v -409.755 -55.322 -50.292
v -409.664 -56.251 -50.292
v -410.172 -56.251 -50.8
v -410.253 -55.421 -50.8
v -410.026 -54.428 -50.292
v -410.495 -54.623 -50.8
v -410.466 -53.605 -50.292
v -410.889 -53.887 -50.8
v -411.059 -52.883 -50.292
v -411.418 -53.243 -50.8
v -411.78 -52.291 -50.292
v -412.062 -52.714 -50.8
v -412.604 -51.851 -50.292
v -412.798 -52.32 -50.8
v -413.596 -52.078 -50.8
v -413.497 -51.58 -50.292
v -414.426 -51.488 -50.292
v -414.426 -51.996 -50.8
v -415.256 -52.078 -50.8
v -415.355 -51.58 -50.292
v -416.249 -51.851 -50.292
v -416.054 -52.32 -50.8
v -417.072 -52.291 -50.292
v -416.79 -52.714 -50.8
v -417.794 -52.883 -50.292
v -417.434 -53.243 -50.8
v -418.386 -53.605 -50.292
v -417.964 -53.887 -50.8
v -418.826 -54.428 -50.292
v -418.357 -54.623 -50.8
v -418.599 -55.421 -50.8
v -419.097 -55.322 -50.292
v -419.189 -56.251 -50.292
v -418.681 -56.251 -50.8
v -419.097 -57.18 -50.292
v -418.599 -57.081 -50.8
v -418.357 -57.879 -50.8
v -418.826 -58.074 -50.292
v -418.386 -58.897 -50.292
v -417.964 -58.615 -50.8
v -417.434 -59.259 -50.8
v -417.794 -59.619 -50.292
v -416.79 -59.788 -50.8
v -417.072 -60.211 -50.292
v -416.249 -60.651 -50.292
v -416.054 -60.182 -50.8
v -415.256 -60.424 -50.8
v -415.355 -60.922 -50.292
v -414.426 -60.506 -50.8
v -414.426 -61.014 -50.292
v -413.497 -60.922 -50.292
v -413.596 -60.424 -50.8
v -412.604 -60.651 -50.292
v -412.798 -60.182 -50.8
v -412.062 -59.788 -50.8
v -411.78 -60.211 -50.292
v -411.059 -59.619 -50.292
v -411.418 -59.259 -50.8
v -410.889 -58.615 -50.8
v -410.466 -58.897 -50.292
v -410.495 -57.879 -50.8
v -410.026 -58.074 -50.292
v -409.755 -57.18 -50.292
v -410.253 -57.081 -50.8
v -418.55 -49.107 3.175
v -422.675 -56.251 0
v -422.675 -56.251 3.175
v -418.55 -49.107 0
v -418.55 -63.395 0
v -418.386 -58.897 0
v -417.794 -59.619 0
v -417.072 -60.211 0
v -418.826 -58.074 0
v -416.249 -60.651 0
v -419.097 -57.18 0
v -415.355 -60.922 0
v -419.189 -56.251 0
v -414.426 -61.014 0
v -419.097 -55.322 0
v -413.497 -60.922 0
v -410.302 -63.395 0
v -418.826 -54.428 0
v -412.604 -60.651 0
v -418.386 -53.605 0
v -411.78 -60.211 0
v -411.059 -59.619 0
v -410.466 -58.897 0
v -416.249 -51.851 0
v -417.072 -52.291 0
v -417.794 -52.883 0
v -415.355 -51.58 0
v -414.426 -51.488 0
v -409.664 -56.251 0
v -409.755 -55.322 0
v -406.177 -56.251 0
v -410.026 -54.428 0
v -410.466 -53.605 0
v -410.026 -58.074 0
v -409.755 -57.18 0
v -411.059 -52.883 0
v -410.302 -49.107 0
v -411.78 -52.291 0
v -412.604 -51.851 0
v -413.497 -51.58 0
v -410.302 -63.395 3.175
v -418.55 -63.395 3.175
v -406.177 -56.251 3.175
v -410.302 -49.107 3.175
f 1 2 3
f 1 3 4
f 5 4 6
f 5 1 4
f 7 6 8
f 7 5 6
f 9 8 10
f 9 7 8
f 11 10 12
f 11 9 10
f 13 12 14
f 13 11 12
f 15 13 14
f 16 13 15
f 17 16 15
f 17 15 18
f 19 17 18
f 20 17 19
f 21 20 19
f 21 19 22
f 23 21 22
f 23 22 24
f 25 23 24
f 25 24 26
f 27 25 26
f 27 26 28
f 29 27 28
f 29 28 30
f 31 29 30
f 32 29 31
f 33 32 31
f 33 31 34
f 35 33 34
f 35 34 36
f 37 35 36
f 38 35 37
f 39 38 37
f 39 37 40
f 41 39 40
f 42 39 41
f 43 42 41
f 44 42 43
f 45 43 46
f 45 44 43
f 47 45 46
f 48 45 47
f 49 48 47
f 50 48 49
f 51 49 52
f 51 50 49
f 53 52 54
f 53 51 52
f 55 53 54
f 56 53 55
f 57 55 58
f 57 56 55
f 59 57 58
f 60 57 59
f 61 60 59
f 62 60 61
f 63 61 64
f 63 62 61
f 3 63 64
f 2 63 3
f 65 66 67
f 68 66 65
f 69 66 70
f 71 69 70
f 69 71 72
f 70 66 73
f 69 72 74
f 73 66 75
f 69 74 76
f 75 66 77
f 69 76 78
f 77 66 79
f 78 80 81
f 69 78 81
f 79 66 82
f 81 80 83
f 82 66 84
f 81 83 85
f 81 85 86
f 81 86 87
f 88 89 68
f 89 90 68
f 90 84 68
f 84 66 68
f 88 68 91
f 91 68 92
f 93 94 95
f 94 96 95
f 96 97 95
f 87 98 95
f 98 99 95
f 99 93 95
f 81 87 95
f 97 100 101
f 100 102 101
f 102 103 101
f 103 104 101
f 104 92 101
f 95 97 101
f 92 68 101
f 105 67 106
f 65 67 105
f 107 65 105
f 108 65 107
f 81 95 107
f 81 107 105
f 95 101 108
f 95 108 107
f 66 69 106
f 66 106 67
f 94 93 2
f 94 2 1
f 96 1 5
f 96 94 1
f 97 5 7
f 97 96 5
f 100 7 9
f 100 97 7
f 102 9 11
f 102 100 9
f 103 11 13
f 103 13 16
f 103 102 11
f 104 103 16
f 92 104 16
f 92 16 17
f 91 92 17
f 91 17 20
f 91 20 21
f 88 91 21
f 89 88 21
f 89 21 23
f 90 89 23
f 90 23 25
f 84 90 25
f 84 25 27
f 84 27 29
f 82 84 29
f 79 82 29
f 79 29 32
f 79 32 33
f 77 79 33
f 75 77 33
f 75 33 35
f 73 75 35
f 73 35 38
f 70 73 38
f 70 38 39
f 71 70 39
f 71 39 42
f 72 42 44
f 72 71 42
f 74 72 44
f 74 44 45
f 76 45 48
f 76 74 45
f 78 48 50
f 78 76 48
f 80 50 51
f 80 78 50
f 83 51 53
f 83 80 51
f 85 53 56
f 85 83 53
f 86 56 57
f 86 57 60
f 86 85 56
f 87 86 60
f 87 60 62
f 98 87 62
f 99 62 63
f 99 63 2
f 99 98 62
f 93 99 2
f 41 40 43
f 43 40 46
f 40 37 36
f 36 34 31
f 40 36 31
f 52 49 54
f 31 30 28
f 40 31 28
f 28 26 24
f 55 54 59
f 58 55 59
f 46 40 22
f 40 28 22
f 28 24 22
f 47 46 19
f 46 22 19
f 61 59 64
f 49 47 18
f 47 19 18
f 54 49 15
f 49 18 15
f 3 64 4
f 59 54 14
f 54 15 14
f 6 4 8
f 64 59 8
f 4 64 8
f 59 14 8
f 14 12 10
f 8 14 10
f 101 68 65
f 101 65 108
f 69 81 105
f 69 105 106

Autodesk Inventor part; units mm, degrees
ref_plane "YZ Plane" through (0, 0, 0) normal (1, 0, 0) x (0, 1, 0)
ref_plane "XZ Plane" through (0, 0, 0) normal (0, 1, 0) x (-1, 0, 0)
ref_plane "XY Plane" through (0, 0, 0) normal (0, 0, 1) x (1, 0, 0)
sketch "Sketch1" plane through (0, 0, 0) normal (0, 0, 1) x (1, 0, 0)
  circle A0 centre (-414.4261, -56.251) radius 4.7625
  point P0 (0, 0)
  dimension "d0" = 9.525
extrude "Extrusion1" add sketch "Sketch1" against normal blind 50.8
sketch "Sketch2" plane through (-414.4261, -56.251, 0) normal (0, 0, 1) x (1, 0, 0)
  circle A0 centre (0, 0) radius 4.7625 projected
  line L0 (-8.2489, 0) -> (-4.1244, 7.1437)
  line L1 (-4.1244, 7.1437) -> (4.1244, 7.1438)
  line L2 (4.1244, 7.1438) -> (8.2489, 0)
  line L3 (8.2489, 0) -> (4.1244, -7.1437)
  line L4 (4.1244, -7.1437) -> (-4.1244, -7.1438)
  line L5 (-4.1244, -7.1438) -> (-8.2489, 0)
  point P0 (414.4261, 56.251)
  dimension "d3" = 14.2875
extrude "Extrusion2" add sketch "Sketch2" along normal blind 3.175 contours A0 | L0 L1 L2 L3 L4 L5
thread "Thread1" size "3/8-16 UNC" class "2A" standard "ANSI Unified Screw Threads" length 25.4
chamfer "Chamfer1" distance 0.508 angle 45 1 edges at (-419.1886, -56.251, -50.8)
properties part number "375 bolt x4" material "Steel"
